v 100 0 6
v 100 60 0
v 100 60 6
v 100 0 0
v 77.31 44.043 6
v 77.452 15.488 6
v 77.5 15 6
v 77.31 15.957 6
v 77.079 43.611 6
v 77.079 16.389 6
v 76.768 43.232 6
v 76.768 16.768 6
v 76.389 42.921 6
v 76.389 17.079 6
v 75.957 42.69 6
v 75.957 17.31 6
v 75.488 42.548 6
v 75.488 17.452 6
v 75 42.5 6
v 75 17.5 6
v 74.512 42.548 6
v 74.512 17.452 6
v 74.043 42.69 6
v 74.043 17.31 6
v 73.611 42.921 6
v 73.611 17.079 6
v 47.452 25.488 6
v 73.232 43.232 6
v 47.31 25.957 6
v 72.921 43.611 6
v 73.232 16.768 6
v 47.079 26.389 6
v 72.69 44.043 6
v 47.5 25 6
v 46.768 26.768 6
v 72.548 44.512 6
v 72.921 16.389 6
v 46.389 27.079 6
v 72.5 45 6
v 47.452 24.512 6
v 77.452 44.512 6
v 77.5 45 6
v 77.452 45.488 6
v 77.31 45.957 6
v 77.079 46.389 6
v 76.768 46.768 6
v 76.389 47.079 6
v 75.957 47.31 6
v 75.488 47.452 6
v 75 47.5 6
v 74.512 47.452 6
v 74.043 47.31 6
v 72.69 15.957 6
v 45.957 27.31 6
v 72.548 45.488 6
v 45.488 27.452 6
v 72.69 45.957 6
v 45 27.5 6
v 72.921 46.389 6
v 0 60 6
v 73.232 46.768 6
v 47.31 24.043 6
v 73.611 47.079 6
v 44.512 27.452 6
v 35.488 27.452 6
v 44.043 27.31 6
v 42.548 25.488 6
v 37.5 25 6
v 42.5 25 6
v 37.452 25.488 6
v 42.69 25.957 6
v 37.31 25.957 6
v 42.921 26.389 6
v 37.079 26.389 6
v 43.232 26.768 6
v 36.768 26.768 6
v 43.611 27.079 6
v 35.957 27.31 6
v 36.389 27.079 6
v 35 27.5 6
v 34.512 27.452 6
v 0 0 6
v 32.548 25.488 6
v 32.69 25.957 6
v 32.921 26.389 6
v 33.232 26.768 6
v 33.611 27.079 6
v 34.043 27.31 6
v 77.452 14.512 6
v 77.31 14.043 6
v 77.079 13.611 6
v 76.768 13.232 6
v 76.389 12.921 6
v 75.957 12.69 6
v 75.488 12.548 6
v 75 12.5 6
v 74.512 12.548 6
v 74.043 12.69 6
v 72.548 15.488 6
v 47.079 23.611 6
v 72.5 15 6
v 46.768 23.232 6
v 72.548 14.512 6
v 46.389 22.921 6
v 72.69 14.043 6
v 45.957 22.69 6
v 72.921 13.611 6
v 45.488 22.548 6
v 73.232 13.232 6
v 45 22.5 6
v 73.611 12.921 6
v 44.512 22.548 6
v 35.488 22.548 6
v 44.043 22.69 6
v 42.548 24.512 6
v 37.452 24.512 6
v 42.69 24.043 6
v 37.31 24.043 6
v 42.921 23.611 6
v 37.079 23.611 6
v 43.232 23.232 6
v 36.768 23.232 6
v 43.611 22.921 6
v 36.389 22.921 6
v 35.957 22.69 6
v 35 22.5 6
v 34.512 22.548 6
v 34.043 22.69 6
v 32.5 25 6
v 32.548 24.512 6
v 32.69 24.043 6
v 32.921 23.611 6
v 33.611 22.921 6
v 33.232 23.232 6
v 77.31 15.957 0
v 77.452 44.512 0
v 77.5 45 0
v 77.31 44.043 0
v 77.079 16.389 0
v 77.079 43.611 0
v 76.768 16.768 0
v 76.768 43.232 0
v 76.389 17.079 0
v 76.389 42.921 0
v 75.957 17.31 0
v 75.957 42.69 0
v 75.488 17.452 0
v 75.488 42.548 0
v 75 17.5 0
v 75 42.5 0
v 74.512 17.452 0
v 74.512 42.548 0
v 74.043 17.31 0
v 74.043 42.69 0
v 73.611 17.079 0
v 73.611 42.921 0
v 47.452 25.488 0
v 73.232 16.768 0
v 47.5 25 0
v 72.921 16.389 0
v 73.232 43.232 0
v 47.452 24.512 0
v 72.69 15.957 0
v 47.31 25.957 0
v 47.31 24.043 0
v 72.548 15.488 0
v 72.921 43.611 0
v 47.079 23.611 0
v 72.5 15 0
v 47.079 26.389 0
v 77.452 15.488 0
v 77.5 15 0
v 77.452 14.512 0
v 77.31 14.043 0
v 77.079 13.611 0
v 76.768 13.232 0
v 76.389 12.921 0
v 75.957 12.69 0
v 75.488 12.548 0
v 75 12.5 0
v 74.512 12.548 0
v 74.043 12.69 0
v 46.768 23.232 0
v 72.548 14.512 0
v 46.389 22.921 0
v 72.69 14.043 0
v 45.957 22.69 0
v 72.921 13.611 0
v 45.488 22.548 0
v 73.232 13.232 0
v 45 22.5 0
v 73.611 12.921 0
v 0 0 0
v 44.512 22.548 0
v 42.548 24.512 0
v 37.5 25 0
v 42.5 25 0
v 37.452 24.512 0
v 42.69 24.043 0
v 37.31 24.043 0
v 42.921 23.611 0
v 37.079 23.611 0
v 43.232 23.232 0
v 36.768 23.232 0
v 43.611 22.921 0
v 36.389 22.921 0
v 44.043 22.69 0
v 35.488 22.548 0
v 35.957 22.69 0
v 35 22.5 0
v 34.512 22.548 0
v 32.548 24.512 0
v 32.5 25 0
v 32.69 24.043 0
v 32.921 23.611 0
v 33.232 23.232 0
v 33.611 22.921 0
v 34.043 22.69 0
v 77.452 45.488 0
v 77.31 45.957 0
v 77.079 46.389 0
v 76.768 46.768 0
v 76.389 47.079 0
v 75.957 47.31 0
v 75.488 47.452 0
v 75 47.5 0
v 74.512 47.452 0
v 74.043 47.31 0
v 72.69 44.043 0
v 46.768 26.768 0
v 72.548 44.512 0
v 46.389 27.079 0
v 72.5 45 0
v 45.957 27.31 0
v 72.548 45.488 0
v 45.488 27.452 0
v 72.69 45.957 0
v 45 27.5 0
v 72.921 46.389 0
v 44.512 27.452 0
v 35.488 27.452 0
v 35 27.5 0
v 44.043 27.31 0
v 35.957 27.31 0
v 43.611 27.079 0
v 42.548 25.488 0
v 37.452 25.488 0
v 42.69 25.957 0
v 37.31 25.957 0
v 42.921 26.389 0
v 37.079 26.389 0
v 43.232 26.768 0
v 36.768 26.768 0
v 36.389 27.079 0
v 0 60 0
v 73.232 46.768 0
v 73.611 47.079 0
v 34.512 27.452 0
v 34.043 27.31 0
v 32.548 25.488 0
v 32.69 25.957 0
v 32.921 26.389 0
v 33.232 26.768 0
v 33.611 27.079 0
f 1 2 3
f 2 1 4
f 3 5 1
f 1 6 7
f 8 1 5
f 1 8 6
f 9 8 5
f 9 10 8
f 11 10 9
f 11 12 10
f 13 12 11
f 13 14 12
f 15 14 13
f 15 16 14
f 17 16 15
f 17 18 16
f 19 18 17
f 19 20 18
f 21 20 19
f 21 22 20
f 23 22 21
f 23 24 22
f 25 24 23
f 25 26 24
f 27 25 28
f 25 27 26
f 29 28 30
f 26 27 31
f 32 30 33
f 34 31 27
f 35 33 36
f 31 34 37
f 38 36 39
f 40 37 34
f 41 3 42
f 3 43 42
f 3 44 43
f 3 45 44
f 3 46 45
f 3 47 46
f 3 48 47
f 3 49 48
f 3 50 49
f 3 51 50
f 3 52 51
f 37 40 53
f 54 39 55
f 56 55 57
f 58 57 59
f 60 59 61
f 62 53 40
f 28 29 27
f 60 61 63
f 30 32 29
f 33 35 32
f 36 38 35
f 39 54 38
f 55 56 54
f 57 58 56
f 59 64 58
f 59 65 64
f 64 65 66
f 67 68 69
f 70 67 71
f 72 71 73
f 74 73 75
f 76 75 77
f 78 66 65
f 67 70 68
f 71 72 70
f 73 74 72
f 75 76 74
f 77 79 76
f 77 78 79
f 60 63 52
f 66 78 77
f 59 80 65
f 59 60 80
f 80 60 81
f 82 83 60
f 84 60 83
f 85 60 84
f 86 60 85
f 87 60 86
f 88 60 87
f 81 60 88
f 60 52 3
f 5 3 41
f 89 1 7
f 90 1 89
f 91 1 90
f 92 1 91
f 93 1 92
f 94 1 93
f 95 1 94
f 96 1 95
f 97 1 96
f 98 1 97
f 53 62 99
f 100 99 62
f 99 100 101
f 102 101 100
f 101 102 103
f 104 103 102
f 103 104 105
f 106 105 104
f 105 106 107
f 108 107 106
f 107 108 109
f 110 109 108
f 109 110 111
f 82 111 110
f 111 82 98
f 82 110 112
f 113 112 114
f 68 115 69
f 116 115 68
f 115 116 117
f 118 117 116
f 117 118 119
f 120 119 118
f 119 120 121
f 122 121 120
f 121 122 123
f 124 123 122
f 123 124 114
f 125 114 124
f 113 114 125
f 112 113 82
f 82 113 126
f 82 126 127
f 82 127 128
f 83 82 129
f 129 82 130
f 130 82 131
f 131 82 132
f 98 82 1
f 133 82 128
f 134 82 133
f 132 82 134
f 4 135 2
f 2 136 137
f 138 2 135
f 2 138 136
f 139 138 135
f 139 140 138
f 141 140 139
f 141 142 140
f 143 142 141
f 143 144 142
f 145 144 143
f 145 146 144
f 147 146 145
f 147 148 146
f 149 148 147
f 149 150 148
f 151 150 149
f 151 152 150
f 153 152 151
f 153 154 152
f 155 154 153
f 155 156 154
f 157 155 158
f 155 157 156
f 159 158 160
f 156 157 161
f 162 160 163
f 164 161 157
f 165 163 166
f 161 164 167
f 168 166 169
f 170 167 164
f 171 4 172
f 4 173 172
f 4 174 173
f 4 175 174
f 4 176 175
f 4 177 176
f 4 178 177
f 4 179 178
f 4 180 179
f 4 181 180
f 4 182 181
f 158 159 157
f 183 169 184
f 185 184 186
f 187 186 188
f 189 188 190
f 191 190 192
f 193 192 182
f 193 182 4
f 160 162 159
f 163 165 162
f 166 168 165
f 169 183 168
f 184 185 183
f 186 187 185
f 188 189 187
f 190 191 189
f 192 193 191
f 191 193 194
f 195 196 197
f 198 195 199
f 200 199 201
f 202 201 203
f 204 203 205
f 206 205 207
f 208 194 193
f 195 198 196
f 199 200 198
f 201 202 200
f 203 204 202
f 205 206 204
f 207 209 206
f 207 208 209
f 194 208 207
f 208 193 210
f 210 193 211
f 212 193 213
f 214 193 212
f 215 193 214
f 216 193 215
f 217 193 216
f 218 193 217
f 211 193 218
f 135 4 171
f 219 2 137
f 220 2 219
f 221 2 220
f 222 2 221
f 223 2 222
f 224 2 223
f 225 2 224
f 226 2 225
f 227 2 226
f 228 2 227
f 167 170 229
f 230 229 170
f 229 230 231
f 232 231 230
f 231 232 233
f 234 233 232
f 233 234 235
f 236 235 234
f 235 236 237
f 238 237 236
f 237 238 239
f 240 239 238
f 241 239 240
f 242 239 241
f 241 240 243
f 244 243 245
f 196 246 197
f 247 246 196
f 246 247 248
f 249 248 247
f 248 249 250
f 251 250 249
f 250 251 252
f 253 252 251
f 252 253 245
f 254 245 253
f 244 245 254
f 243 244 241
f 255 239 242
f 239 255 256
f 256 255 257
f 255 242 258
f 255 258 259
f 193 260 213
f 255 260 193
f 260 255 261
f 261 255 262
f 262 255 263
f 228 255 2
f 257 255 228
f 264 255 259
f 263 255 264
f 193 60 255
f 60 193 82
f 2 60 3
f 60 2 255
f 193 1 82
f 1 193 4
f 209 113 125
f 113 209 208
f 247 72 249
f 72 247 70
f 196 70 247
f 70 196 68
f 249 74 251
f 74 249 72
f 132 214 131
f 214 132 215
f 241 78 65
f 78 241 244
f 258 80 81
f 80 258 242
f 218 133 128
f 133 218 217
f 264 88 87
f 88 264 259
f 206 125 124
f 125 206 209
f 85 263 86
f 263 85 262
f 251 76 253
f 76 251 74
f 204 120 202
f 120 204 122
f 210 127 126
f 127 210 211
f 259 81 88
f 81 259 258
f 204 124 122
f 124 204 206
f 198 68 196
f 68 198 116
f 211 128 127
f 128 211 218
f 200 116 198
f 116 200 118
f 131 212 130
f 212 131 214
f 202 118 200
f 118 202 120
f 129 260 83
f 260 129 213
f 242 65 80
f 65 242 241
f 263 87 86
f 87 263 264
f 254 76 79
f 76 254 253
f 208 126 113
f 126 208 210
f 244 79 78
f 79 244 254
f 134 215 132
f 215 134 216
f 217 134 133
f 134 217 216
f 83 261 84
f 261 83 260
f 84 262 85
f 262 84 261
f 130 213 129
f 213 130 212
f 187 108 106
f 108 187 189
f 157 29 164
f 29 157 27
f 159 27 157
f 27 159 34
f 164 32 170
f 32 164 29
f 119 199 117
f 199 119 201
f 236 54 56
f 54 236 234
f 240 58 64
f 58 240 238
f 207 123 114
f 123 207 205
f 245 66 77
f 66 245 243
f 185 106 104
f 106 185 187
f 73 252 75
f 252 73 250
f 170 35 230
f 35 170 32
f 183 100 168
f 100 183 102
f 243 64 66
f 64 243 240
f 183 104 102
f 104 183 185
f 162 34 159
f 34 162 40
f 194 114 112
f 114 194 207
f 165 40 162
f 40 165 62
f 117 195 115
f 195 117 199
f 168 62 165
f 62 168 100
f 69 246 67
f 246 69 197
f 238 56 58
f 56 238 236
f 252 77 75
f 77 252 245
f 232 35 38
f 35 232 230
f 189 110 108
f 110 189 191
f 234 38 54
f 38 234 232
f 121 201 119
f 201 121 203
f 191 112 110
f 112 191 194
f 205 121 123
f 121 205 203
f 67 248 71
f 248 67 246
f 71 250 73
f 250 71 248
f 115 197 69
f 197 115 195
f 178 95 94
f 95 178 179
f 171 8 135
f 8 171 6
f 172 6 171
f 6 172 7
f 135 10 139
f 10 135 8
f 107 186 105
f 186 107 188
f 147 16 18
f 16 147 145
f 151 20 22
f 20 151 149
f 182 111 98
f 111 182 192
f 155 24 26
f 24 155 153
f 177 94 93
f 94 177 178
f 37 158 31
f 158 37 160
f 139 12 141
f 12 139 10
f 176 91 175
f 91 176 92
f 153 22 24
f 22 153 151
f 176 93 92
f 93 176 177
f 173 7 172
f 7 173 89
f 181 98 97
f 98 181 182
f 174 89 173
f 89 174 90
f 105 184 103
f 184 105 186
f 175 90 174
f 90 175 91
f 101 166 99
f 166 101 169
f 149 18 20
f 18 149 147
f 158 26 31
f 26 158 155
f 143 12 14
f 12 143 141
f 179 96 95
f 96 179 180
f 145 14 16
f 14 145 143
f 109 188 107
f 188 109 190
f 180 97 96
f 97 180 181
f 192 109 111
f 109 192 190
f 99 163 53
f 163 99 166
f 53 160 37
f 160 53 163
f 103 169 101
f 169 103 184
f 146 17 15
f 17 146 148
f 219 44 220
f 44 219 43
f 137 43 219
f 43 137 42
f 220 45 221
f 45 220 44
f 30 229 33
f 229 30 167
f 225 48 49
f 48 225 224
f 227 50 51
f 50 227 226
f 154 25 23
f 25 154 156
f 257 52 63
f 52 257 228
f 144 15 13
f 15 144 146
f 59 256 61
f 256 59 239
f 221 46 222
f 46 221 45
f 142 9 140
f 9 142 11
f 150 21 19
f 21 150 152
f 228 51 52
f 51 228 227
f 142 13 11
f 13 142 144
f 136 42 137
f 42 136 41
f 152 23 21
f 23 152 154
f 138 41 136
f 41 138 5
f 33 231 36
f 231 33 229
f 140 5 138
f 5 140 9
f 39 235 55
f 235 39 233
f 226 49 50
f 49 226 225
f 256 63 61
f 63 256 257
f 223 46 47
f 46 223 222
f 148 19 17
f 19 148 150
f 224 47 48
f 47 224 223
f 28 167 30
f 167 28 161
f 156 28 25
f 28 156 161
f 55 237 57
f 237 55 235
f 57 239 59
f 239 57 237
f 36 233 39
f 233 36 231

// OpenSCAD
$fn = 32;

// ----------------------------------------------------------------------
// Hole field: plate with holes at given coordinates
// ----------------------------------------------------------------------

// --- parameters (mm) ---
plate_l = 100;            // plate length, X
plate_w = 60;             // plate width, Y
plate_t = 6;              // plate thickness, Z
hole_d = 5;               // hole diameter

difference() {
  cube([plate_l, plate_w, plate_t]);
  translate([35, 25, -1]) cylinder(h = plate_t + 2, d = hole_d);
  translate([45, 25, -1]) cylinder(h = plate_t + 2, d = hole_d);
  translate([75, 15, -1]) cylinder(h = plate_t + 2, d = hole_d);
  translate([75, 45, -1]) cylinder(h = plate_t + 2, d = hole_d);
}
